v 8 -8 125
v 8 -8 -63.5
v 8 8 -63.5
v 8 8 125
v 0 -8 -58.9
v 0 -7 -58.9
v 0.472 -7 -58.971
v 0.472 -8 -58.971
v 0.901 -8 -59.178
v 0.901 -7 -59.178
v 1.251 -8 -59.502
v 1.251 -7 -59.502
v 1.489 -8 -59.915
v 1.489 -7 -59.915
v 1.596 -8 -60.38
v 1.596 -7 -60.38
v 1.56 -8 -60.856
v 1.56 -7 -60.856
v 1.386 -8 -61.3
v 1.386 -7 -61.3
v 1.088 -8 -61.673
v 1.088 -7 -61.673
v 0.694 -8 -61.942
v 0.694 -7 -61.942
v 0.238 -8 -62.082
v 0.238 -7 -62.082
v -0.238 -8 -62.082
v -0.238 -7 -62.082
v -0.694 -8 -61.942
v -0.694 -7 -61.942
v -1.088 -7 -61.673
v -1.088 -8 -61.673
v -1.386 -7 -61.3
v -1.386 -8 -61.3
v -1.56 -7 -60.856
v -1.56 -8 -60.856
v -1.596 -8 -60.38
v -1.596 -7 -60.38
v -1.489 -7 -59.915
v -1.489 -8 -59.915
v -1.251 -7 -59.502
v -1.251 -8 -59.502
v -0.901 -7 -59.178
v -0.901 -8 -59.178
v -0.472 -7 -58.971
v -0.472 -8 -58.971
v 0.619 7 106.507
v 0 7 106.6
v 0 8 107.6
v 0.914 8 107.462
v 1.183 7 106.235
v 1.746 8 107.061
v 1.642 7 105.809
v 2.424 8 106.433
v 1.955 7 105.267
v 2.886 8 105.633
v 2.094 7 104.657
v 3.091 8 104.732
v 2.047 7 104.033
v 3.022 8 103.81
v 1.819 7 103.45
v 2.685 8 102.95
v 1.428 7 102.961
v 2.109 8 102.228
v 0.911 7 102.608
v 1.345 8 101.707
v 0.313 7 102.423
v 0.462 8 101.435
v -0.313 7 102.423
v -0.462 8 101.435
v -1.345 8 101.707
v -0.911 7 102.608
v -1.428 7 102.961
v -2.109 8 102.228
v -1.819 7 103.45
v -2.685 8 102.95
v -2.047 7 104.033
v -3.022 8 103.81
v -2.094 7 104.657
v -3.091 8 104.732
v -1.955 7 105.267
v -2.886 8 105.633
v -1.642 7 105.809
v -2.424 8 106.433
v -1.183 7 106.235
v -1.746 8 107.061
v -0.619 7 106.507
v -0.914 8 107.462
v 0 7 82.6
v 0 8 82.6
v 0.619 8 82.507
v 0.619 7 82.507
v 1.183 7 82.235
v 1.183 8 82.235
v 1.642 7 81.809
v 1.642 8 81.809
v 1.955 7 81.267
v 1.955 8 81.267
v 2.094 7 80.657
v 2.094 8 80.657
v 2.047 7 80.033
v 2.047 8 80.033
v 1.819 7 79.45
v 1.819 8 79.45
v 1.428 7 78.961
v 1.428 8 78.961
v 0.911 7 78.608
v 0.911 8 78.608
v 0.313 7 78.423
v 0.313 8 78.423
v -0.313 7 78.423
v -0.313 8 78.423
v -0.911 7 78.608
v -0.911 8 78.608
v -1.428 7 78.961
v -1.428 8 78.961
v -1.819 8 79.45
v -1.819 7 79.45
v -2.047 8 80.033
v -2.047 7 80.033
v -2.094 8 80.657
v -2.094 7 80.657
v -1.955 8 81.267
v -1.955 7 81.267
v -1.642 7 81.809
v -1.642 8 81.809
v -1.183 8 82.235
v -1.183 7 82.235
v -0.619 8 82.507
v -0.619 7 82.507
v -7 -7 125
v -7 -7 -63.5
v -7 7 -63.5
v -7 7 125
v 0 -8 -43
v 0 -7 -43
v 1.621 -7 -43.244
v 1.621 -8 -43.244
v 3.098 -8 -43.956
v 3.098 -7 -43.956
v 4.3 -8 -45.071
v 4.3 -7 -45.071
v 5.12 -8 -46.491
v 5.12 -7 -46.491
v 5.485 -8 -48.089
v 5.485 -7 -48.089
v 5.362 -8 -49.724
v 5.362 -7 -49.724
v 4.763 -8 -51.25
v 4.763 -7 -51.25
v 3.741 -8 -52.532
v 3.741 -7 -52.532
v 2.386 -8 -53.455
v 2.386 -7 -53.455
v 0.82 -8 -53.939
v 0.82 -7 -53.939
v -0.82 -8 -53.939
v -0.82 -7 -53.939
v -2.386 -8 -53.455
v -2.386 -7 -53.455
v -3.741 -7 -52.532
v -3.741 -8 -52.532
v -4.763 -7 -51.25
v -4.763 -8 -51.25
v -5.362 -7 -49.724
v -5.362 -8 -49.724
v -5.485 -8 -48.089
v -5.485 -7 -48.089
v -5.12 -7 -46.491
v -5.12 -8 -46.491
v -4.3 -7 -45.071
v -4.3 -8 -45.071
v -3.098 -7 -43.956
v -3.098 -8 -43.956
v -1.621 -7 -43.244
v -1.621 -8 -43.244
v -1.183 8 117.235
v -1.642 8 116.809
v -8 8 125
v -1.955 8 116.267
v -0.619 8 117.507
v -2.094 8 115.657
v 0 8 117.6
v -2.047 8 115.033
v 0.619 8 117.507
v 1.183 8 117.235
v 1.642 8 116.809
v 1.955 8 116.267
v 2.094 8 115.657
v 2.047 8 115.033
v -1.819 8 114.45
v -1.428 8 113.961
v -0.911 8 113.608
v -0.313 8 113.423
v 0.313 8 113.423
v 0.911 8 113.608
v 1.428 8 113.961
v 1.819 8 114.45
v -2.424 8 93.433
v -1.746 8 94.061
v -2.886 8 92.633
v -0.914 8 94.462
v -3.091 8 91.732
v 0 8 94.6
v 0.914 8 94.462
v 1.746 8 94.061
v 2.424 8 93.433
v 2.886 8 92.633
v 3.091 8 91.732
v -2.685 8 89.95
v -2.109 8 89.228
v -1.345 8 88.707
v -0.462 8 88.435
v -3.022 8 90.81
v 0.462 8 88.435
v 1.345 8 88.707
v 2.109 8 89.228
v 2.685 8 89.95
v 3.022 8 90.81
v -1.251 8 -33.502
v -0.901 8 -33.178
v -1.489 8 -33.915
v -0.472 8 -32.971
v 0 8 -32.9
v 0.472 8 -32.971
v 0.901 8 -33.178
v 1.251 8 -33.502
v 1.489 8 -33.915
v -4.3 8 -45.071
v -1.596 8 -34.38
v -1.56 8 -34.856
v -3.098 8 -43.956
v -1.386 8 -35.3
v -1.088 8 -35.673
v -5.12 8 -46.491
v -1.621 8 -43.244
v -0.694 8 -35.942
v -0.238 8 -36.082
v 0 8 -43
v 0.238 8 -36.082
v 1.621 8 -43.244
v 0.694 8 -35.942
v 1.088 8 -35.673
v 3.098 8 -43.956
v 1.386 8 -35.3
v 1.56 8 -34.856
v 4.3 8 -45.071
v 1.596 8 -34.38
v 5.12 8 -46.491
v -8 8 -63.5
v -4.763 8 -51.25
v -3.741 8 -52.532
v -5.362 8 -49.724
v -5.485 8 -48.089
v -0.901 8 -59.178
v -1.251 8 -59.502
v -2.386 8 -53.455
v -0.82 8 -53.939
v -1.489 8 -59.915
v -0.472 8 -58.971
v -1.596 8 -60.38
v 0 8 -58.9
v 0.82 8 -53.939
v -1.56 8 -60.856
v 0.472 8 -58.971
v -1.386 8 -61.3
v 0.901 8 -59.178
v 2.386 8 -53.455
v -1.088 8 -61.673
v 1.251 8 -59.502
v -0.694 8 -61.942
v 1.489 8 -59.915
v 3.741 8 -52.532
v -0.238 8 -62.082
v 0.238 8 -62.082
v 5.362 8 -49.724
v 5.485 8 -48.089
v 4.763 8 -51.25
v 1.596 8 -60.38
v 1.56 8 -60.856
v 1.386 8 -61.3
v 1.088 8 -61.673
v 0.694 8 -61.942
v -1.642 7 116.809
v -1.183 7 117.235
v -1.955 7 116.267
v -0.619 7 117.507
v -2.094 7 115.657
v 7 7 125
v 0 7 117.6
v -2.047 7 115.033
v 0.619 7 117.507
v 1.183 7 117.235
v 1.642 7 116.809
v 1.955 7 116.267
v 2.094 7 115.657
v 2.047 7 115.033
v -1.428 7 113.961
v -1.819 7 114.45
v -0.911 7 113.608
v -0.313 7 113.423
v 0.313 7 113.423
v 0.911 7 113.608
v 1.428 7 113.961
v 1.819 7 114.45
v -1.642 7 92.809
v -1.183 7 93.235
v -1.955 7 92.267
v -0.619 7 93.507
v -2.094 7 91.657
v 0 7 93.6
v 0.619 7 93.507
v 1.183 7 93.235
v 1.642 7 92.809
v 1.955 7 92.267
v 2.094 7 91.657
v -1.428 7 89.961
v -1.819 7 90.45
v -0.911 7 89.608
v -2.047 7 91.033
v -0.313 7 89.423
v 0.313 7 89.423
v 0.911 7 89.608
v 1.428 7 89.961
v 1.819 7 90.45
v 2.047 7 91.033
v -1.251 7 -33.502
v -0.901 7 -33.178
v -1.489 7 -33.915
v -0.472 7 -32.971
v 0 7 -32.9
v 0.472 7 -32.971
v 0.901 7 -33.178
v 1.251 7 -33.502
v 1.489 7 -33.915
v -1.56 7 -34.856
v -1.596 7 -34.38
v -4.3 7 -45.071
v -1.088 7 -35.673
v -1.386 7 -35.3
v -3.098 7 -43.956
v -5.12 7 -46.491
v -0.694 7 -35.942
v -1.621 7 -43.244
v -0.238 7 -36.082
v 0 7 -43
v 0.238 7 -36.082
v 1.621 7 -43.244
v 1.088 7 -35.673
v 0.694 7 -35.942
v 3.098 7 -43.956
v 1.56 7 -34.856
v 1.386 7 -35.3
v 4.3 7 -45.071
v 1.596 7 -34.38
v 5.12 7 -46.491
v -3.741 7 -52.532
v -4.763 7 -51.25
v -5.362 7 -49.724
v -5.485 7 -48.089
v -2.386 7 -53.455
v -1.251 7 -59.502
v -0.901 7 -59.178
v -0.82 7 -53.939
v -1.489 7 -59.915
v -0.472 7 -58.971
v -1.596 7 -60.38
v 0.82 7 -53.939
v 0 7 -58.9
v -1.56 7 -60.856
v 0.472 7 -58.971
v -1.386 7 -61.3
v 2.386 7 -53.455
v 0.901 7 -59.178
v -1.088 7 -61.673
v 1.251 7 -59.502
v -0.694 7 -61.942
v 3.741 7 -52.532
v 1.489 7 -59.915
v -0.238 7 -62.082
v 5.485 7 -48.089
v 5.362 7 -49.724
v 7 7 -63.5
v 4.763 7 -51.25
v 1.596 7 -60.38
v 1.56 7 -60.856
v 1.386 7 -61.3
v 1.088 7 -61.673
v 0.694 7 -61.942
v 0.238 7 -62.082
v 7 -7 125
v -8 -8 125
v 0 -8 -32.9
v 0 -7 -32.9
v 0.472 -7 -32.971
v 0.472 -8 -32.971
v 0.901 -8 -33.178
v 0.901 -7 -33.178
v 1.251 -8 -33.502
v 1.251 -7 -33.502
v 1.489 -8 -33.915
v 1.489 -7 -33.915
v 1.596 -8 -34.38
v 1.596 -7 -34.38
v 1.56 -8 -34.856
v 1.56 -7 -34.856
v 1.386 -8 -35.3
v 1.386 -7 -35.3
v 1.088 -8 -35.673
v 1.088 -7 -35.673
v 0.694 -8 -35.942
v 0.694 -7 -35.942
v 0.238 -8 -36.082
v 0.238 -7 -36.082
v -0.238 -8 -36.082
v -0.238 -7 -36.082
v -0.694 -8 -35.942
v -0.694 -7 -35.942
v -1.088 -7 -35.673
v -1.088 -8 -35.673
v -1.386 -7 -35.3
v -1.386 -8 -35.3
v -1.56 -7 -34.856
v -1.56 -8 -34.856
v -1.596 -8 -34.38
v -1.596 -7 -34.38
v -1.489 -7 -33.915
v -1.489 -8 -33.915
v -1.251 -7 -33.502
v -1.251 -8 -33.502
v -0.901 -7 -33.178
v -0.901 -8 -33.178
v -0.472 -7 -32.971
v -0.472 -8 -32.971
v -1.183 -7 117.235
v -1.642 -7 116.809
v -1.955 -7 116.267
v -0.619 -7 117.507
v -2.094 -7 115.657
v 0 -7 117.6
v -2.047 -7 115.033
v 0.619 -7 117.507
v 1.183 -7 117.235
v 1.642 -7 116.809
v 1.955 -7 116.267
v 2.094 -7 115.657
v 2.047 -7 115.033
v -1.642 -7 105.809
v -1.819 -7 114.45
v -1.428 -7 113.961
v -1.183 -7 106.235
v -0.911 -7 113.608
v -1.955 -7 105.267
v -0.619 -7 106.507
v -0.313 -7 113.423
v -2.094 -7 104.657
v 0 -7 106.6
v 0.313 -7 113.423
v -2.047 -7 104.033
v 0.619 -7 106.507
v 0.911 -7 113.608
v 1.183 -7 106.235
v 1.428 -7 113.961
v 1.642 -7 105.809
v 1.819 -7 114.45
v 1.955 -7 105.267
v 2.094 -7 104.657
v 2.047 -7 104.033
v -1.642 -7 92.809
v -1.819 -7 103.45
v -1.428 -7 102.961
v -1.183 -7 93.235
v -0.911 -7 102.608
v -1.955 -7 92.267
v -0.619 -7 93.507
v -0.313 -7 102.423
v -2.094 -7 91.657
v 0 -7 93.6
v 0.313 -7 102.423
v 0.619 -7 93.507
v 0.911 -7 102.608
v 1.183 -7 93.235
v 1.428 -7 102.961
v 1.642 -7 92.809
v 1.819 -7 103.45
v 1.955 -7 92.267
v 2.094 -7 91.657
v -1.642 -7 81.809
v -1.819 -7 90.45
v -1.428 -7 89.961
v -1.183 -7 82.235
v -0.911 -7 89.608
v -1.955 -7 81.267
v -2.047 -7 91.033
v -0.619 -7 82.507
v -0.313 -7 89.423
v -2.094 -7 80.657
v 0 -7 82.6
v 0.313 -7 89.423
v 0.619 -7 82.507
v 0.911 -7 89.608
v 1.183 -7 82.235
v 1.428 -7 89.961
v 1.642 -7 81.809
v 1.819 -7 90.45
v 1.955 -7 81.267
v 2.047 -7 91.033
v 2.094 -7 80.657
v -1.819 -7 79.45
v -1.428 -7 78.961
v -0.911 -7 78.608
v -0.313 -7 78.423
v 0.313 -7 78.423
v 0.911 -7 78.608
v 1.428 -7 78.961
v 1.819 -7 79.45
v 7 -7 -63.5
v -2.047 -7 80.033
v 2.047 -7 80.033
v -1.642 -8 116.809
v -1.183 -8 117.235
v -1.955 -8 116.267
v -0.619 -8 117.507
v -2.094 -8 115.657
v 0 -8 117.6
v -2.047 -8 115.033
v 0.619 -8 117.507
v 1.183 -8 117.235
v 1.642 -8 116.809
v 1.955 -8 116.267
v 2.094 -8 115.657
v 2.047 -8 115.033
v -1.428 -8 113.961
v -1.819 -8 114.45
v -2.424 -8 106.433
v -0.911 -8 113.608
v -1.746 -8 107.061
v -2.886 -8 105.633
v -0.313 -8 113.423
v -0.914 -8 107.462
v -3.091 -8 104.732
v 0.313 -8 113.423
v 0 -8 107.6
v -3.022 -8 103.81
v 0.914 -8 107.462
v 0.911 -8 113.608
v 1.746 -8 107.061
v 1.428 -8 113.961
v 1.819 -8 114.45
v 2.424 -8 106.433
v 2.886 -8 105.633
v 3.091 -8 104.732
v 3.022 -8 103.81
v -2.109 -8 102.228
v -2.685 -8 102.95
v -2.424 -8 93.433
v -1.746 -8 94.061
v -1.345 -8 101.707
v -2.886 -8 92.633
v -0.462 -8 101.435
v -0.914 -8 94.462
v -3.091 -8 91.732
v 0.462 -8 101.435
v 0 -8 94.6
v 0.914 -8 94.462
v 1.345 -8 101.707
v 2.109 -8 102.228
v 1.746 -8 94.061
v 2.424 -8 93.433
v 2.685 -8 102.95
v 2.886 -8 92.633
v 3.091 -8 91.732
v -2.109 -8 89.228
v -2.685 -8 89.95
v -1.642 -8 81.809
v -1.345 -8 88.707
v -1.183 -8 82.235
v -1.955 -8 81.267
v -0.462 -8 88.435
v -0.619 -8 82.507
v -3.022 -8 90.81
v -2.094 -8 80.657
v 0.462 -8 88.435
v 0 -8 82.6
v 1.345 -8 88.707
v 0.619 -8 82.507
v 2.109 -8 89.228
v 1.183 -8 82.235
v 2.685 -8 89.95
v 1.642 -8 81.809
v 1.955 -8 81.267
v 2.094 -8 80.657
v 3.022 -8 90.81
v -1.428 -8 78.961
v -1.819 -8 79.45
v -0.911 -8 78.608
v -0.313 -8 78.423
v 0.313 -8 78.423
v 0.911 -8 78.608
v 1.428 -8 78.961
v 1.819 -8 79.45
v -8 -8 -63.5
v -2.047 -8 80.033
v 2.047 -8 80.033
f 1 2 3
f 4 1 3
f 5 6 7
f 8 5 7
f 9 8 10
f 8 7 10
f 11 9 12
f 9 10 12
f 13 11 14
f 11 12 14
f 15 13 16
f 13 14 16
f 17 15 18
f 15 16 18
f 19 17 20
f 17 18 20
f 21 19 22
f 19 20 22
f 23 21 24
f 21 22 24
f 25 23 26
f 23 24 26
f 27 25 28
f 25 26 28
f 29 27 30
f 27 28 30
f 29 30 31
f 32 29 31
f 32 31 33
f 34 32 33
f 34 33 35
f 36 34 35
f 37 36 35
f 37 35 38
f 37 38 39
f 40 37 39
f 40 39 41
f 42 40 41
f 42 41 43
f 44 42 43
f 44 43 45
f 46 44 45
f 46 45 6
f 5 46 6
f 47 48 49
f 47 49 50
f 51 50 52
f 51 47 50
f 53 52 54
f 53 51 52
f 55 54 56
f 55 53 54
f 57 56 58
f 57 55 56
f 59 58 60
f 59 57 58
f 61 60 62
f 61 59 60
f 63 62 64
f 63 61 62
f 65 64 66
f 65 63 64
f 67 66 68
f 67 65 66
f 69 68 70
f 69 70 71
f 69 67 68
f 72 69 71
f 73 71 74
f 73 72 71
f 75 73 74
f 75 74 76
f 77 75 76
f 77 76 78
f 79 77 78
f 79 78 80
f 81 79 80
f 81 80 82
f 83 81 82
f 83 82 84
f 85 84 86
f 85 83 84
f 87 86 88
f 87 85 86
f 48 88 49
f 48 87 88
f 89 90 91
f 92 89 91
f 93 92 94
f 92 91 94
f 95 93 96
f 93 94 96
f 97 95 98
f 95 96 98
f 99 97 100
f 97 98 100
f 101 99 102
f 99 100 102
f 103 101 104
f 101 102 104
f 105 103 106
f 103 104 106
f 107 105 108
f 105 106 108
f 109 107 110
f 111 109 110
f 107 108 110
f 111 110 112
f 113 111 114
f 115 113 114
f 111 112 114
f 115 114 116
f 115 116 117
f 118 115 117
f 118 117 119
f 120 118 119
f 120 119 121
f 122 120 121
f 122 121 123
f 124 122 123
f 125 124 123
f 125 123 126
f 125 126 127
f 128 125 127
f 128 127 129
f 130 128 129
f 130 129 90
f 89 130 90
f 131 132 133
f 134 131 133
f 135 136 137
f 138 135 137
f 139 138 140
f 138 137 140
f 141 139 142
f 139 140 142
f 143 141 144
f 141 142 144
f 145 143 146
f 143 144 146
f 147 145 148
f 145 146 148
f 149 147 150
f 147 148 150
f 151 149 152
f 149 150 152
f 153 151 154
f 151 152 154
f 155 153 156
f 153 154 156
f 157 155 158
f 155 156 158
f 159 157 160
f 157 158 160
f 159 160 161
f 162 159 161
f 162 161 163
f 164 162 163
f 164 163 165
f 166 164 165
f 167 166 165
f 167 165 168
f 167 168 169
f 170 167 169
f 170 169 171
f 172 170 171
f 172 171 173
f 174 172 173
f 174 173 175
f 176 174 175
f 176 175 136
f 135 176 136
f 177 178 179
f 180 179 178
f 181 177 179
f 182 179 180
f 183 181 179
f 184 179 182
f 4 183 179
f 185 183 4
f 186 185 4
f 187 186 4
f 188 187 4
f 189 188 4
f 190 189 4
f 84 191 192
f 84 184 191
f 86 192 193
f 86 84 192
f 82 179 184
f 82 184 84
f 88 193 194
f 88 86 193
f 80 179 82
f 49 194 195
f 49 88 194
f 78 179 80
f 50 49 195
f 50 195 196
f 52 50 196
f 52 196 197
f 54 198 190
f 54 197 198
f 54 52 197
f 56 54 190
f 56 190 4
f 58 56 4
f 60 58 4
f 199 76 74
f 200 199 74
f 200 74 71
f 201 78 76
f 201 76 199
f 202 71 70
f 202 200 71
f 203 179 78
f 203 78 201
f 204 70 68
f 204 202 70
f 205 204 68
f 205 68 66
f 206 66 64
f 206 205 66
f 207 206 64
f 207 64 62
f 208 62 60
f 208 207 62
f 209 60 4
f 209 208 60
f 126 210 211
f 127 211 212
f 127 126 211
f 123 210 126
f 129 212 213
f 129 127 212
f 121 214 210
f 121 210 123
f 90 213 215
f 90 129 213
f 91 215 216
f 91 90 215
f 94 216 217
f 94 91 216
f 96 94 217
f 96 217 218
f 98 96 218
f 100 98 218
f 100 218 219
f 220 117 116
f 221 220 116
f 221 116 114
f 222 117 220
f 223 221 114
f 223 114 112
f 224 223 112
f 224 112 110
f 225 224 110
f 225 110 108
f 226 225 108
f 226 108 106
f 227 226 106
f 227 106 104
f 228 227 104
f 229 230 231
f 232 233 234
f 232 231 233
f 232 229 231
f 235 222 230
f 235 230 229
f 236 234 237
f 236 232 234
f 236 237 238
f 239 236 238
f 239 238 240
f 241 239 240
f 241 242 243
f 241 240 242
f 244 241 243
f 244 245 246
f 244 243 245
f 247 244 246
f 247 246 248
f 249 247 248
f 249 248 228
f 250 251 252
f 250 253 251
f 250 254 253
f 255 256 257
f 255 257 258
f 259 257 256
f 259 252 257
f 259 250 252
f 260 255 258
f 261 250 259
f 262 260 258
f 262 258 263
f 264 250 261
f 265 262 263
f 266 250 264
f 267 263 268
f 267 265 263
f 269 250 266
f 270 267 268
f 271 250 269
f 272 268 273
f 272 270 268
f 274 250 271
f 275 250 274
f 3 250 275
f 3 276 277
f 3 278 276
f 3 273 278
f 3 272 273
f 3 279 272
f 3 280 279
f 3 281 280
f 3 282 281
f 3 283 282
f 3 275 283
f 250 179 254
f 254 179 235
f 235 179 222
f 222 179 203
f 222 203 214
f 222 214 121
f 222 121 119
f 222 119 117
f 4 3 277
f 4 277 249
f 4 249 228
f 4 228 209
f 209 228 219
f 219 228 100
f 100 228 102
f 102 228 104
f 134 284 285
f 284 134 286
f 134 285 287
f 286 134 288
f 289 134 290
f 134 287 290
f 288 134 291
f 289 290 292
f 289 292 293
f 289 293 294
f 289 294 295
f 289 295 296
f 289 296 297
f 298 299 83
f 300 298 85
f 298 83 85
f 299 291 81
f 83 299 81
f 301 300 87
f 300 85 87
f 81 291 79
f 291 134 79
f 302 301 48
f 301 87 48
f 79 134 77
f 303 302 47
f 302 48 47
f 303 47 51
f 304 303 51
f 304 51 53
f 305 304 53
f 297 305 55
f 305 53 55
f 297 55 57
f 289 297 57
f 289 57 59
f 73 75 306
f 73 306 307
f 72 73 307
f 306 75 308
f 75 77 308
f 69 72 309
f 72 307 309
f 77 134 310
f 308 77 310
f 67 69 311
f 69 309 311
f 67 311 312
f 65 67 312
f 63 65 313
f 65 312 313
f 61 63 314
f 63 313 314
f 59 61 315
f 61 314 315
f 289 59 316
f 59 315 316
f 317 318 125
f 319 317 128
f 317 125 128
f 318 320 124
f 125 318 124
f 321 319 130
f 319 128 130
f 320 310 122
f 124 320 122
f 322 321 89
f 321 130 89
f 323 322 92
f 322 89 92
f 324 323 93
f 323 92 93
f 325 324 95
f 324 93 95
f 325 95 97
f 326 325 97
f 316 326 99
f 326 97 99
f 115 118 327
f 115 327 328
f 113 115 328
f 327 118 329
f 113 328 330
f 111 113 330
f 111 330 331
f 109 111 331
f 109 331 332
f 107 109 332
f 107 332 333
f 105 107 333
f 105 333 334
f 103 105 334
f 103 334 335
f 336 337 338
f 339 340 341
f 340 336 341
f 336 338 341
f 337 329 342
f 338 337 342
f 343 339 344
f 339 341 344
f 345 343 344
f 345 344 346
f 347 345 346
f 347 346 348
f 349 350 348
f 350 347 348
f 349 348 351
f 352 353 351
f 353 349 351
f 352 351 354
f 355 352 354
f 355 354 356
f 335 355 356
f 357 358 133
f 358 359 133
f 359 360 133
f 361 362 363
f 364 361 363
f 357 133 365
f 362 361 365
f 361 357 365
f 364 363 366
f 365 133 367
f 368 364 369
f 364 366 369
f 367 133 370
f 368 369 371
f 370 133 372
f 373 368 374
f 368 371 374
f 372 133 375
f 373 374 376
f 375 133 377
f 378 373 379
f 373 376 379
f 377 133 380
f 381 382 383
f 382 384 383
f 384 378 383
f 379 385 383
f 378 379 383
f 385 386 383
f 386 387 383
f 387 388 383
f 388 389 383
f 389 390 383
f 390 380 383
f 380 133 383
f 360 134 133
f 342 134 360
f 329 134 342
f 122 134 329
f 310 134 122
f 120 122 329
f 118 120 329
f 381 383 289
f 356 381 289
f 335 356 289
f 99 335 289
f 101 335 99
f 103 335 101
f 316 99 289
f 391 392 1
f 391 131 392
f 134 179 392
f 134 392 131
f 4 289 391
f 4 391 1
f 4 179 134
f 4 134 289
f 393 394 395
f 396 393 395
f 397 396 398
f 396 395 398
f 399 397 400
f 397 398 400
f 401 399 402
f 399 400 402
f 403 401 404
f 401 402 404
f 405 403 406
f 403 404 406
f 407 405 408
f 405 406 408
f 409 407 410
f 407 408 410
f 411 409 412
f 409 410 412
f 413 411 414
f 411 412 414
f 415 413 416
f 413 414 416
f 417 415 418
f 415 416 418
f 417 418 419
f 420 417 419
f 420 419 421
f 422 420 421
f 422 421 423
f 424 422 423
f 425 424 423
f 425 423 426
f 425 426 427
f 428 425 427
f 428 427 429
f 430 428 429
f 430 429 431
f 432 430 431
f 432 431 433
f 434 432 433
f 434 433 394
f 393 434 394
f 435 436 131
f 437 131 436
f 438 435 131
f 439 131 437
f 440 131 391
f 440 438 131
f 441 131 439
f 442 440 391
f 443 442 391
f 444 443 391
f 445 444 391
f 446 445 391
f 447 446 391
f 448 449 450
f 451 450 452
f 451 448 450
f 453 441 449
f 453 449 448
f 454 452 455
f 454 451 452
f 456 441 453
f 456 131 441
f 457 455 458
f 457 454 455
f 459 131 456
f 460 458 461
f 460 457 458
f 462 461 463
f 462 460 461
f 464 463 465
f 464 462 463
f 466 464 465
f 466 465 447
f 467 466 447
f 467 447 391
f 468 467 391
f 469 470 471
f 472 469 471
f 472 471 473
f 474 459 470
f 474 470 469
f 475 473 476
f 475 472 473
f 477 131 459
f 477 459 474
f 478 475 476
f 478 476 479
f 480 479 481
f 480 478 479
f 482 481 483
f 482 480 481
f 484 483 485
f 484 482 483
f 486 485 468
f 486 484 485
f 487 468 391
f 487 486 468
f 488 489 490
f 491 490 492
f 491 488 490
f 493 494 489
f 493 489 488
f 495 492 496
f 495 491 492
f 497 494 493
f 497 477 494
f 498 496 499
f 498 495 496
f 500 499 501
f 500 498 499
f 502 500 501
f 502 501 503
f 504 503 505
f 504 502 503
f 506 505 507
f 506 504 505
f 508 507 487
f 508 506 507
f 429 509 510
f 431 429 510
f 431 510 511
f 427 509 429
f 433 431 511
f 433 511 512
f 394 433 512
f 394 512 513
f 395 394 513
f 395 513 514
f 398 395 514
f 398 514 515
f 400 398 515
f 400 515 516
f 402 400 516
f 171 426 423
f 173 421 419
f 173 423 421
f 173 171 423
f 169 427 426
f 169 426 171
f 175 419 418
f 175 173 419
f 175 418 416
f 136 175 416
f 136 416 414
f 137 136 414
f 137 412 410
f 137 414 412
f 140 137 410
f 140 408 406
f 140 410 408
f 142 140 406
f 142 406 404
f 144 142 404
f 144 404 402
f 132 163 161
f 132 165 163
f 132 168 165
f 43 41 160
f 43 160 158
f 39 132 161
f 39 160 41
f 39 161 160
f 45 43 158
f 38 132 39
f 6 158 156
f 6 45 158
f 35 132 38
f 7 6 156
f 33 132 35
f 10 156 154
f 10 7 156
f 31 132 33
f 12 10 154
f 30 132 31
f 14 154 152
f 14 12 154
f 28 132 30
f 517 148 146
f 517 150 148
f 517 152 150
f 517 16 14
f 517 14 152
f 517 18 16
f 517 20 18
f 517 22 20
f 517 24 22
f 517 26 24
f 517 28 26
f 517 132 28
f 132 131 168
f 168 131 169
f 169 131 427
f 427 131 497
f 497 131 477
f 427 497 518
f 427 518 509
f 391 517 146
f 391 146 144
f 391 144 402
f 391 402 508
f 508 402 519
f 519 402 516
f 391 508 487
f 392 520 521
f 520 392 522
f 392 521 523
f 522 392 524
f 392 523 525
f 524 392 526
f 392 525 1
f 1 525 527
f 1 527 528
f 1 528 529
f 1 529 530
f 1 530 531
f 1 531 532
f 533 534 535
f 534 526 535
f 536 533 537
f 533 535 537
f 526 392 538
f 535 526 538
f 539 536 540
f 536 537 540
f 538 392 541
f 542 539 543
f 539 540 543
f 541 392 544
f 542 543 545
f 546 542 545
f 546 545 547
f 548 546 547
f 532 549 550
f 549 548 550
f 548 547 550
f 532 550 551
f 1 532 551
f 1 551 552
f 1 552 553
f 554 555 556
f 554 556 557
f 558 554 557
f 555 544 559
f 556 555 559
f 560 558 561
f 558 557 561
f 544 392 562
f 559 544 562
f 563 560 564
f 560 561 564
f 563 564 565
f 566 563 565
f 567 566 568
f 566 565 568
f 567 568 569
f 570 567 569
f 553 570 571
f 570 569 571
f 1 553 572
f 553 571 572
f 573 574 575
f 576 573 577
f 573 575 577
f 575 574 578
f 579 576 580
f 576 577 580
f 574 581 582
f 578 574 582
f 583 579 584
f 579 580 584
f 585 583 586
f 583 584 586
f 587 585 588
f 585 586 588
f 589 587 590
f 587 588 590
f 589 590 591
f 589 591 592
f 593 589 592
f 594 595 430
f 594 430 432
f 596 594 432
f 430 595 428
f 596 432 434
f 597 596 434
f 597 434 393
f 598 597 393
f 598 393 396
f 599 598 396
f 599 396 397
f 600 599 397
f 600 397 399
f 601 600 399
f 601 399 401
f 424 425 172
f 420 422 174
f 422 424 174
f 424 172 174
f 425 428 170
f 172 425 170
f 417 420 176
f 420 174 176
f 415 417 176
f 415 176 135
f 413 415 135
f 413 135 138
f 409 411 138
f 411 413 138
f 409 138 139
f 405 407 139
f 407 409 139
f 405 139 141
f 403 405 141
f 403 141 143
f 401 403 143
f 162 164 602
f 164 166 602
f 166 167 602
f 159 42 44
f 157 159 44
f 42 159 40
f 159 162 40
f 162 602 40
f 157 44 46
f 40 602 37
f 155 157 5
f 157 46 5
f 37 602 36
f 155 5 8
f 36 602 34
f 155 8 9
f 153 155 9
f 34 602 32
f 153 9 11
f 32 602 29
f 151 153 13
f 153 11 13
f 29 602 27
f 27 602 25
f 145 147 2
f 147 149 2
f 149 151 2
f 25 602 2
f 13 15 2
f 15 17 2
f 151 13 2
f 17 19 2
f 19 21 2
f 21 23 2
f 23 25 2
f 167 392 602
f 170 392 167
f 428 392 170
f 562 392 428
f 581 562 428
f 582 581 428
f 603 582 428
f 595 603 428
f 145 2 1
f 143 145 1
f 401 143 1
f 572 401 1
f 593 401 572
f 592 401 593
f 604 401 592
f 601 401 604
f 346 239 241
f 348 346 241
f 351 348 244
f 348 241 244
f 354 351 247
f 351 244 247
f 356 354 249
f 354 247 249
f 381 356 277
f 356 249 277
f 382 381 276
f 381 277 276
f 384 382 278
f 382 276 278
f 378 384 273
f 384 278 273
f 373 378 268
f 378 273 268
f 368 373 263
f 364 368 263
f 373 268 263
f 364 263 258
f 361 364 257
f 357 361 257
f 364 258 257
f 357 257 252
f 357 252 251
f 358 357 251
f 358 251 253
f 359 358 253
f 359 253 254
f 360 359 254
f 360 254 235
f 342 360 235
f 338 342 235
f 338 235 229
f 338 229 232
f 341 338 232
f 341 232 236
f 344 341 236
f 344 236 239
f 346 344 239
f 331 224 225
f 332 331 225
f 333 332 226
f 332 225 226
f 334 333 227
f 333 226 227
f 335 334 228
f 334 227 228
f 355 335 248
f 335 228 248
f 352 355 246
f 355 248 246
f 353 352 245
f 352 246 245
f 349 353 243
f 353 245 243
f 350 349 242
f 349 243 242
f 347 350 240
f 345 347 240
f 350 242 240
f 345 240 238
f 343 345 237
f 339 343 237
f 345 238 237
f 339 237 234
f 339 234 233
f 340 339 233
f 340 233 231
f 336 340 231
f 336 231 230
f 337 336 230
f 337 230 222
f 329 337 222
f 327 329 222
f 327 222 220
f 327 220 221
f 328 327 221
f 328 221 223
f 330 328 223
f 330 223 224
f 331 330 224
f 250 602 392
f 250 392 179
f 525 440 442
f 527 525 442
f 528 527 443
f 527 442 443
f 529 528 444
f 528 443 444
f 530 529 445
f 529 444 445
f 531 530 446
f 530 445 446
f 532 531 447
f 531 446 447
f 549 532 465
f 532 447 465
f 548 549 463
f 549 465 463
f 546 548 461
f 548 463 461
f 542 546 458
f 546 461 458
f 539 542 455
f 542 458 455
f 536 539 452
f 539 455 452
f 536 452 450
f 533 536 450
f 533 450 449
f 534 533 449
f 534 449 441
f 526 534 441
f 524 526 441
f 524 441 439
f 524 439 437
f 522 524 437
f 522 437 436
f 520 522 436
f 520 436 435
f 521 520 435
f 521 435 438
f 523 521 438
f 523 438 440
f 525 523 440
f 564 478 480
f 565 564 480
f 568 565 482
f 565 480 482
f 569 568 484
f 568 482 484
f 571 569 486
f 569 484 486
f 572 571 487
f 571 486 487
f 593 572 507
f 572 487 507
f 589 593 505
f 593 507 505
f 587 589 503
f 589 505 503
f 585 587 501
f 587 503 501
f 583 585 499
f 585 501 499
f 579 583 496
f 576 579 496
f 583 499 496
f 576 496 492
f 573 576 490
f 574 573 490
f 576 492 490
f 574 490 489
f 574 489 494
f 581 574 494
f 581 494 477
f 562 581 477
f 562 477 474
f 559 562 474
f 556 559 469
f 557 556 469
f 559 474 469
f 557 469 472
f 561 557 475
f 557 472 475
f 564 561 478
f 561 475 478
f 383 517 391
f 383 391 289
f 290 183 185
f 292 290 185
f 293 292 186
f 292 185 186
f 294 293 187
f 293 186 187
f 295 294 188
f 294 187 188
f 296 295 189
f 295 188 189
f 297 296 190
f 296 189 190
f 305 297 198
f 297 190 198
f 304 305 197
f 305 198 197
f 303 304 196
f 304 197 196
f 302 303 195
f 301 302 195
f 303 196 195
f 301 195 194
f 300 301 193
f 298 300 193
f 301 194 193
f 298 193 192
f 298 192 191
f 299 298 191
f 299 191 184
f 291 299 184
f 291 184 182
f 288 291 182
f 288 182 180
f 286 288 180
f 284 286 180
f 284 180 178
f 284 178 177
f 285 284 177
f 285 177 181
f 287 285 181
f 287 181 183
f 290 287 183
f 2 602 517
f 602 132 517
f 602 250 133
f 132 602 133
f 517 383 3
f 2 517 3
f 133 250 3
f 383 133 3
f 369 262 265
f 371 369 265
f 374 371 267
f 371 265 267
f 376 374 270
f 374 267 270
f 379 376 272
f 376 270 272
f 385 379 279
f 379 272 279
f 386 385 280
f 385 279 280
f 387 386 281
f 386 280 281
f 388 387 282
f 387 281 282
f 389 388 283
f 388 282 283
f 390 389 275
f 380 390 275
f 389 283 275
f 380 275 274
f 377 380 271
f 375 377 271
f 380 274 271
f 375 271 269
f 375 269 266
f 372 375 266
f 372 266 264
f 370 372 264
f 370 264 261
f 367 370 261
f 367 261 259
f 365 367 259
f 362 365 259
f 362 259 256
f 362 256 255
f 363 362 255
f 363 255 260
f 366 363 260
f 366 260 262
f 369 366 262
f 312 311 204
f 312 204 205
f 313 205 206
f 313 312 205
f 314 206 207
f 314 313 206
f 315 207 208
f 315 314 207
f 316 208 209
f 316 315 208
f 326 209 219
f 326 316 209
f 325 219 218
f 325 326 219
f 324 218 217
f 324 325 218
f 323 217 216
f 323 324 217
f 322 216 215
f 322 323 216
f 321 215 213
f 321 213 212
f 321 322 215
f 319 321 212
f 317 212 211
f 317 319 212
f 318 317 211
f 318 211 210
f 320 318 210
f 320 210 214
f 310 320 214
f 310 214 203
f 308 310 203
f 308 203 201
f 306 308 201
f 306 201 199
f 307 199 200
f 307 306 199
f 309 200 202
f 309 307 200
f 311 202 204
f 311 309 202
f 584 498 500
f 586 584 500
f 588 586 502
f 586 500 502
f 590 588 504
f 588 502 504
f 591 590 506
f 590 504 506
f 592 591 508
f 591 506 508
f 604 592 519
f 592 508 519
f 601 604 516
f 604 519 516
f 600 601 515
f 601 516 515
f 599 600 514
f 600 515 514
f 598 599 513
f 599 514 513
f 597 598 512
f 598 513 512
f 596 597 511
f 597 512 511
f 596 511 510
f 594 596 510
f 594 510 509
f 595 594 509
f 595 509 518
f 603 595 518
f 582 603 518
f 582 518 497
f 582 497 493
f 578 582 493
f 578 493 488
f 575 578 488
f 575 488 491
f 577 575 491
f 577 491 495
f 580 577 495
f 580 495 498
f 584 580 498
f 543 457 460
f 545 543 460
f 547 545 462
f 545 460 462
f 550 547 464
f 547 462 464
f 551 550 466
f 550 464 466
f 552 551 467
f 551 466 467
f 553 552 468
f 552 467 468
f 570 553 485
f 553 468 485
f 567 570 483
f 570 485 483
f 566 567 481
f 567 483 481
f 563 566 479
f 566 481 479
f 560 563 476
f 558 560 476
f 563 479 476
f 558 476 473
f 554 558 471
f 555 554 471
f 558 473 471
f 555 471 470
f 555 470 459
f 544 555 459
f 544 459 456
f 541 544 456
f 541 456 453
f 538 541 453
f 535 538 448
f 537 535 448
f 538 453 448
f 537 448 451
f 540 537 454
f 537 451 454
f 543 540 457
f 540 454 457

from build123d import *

# Parameters (mm, degrees)
BOSS_EXTRUDE1_DEPTH      = 125
BOSS_EXTRUDE1_DEPTH_BACK = 63.5
SKETCH1_W                = 16
SKETCH1_H                = 16
SKETCH1_W_2              = 14
SKETCH1_H_2              = 14
SKETCH2_R                = 2.1
SKETCH2_R_2              = 1.6
SKETCH2_R_3              = 5.5
CUT_EXTRUDE1_DEPTH       = 127.273512662
CHAMFER1_SIZE            = 1.5


with BuildPart() as part:
    # Sketch1 → Boss-Extrude1 (new, two sides: drawn at the far end of the back side and taken through both)
    with BuildSketch(Plane.XY.offset(-BOSS_EXTRUDE1_DEPTH_BACK)):
        Rectangle(SKETCH1_W, SKETCH1_H)
        Rectangle(SKETCH1_W_2, SKETCH1_H_2, mode=Mode.SUBTRACT)
    extrude(amount=BOSS_EXTRUDE1_DEPTH + BOSS_EXTRUDE1_DEPTH_BACK)

    # Sketch2 → Cut-Extrude1 (cut, through all)
    with BuildSketch(Plane(origin=(0, 8, 0), x_dir=(1, 0, 0), z_dir=(0, 1, 0))):
        with Locations(Location((0, -115.5, 0), (0, 0, 270))):
            Circle(SKETCH2_R)
        with Locations(Location((0, -104.5, 0), (0, 0, 270))):
            Circle(SKETCH2_R_2)
        with Locations(Location((0, 48.5, 0), (0, 0, 270))):
            Circle(SKETCH2_R_3)
        with Locations(Location((0, 60.5, 0), (0, 0, 270))):
            Circle(SKETCH2_R_2)
        with Locations(Location((0, 34.5, 0), (0, 0, 270))):
            Circle(SKETCH2_R_2)
        with Locations(Location((0, -80.5, 0), (0, 0, 270))):
            Circle(SKETCH2_R)
        with Locations(Location((0, -91.5, 0), (0, 0, 270))):
            Circle(SKETCH2_R_2)
    extrude(amount=-CUT_EXTRUDE1_DEPTH, mode=Mode.SUBTRACT)

    # Chamfer1
    # the kernel refuses this chamfer: 1.5 mm, written as the material it takes off along each edge
    with BuildSketch(Plane(origin=(0, 8, 104.5), x_dir=(0, 0, 1), z_dir=(-1, 0, 0))) as chamfer1_piece_1:
        Polygon((1.6 + CHAMFER1_SIZE, 0), (1.6, -CHAMFER1_SIZE), (1.6, 0), align=None)
    revolve(axis=Axis((0, 8, 104.5), (0, 1, 0)), mode=Mode.SUBTRACT)
    with BuildSketch(Plane(origin=(0, 8, 91.5), x_dir=(0, 0, 1), z_dir=(-1, 0, 0))) as chamfer1_piece_2:
        Polygon((1.6 + CHAMFER1_SIZE, 0), (1.6, -CHAMFER1_SIZE), (1.6, 0), align=None)
    revolve(axis=Axis((0, 8, 91.5), (0, 1, 0)), mode=Mode.SUBTRACT)
    with BuildSketch(Plane(origin=(0, -8, 104.5), x_dir=(0, 0, 1), z_dir=(-1, 0, 0))) as chamfer1_piece_3:
        Polygon((1.6 + CHAMFER1_SIZE, 0), (1.6, CHAMFER1_SIZE), (1.6, 0), align=None)
    revolve(axis=Axis((0, -8, 104.5), (0, 1, 0)), mode=Mode.SUBTRACT)
    with BuildSketch(Plane(origin=(0, -8, 91.5), x_dir=(0, 0, 1), z_dir=(-1, 0, 0))) as chamfer1_piece_4:
        Polygon((1.6 + CHAMFER1_SIZE, 0), (1.6, CHAMFER1_SIZE), (1.6, 0), align=None)
    revolve(axis=Axis((0, -8, 91.5), (0, 1, 0)), mode=Mode.SUBTRACT)


solid = part.part
